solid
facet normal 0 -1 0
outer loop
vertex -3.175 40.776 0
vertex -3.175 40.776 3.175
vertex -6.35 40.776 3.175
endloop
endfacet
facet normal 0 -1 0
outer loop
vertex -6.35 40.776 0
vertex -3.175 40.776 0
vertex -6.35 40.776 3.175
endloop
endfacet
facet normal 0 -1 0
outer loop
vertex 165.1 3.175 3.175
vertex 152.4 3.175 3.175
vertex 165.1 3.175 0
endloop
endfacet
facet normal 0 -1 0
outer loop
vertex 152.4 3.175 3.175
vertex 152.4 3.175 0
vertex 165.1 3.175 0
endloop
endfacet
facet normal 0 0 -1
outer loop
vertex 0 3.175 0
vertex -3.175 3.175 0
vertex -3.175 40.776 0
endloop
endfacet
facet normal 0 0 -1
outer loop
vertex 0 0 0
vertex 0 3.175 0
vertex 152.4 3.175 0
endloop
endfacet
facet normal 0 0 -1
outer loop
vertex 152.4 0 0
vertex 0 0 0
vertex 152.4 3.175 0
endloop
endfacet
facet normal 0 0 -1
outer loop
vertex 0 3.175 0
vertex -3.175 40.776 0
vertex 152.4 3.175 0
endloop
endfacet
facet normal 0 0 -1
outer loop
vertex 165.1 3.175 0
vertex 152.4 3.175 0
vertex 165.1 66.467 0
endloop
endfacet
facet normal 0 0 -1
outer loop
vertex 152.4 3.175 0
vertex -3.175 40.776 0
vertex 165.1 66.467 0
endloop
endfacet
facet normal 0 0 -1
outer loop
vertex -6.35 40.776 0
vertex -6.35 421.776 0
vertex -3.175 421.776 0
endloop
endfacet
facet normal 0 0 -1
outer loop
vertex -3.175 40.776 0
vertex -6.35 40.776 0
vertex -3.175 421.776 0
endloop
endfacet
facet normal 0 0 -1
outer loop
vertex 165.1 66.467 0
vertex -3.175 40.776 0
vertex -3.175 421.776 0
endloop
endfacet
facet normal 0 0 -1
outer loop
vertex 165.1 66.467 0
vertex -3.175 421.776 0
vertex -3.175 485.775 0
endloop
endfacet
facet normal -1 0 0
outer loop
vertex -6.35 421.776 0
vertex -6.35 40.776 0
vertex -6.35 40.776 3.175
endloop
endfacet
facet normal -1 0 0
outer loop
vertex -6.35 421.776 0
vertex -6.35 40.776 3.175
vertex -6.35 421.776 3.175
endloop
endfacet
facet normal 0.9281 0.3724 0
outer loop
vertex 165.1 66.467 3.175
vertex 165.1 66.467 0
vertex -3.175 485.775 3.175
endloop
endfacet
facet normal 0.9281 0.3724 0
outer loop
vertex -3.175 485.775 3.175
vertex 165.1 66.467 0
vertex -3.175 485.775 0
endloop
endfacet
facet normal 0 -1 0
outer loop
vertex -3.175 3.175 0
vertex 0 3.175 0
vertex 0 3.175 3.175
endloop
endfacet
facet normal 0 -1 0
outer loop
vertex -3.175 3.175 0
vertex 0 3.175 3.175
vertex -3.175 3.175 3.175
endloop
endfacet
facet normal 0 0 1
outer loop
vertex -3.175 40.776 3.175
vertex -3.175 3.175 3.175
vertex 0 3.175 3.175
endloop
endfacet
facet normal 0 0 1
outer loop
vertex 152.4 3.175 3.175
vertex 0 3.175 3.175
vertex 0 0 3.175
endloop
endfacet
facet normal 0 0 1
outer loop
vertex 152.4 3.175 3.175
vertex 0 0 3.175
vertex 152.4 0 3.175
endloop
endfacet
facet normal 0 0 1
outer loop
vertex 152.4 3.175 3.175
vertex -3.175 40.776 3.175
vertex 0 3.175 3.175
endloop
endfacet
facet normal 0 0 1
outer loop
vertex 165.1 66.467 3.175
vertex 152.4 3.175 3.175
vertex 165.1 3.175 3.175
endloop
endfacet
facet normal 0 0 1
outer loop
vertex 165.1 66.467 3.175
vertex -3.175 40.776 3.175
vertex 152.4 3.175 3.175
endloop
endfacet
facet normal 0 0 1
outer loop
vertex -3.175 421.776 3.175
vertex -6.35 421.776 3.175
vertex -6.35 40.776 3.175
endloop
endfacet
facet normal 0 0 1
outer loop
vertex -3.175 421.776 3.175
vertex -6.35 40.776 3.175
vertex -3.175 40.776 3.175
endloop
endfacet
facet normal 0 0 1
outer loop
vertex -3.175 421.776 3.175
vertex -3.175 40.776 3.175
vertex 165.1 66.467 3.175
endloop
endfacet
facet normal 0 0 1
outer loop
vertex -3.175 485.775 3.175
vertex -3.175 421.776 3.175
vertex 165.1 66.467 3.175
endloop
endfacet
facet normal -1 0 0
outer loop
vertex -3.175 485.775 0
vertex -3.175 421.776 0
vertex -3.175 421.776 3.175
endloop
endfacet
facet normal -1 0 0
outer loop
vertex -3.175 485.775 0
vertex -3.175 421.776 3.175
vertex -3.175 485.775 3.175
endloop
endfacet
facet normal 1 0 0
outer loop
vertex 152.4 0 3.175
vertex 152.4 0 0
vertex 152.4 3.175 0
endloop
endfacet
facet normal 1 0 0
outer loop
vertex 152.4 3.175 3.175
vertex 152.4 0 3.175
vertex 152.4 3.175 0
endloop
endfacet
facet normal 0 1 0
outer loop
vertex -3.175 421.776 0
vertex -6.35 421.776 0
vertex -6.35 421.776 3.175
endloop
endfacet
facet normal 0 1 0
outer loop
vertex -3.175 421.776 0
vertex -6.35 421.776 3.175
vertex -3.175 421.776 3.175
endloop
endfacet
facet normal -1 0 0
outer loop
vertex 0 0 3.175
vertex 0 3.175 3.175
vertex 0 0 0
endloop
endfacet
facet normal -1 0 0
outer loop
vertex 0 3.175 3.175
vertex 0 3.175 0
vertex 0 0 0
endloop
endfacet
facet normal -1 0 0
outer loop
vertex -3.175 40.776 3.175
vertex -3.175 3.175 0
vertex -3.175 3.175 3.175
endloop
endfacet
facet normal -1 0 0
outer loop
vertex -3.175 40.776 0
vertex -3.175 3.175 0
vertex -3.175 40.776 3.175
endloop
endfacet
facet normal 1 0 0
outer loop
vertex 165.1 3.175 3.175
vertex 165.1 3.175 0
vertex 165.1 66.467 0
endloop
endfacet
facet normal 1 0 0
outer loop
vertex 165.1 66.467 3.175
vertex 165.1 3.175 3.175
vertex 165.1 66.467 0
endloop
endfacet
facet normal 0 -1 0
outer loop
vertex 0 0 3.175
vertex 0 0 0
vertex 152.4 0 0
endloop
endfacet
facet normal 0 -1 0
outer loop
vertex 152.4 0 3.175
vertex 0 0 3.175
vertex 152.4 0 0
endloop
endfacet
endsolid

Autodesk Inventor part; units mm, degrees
ref_plane "YZ Plane" through (0, 0, 0) normal (1, 0, 0) x (0, 1, 0)
ref_plane "XZ Plane" through (0, 0, 0) normal (0, 1, 0) x (-1, 0, 0)
ref_plane "XY Plane" through (0, 0, 0) normal (0, 0, 1) x (1, 0, 0)
sketch "Sketch1" plane through (0, 0, 0) normal (0, 0, 1) x (1, 0, 0)
  line L0 (0, 0) -> (152.4, 0)
  line L1 (152.4, 0) -> (152.4, 3.175)
  line L2 (152.4, 3.175) -> (0, 3.175)
  line L3 (0, 3.175) -> (0, 0)
  line L4 (0, 3.175) -> (11.1125, 3.175)
  line L5 (152.4, 3.175) -> (190.5, 3.175)
  line L6 (0, 3.175) -> (11.1125, 3.175)
  line L7 (0, 3.175) -> (-3.175, 3.175)
  line L8 (-3.175, 3.175) -> (-3.175, 485.775)
  line L9 (-3.175, 485.775) -> (0, 485.775)
  line L10 (0, 485.775) -> (0, 3.175)
  line L11 (-3.175, 40.7756) -> (-6.35, 40.7756)
  line L12 (-6.35, 40.7756) -> (-6.35, 421.7756)
  line L13 (-6.35, 421.7756) -> (-3.175, 421.7756)
  line L14 (-3.175, 421.7756) -> (-3.175, 40.7756)
  line L15 (190.5, 3.175) -> (-3.175, 485.775)
  line L16 (165.1, 3.175) -> (165.1, 66.675)
  line L17 (165.1, 3.175) -> (228.6, 3.175) construction
  point P0 (5.5563, 3.175)
  point P1 (-1.5875, 3.175)
  point P2 (-4.7625, 40.7756)
  point P3 (-3.175, 421.7756)
  point P4 (165.1, 66.4668)
  dimension "d0" = 152.4
  dimension "d1" = 3.175
  dimension "d7" = 38.1
  dimension "d15" = 3.175
  dimension "d16" = 482.6
  dimension "d17" = 3.175
  dimension "d18" = 381
  dimension "d19" = 37.6006
  dimension "d20" = 63.5
  dimension "d21" = 90
  dimension "d22" = 25.4
extrude "Extrusion1" add sketch "Sketch1" along normal blind 3.175 contours L3 L2 L1 L0 | L10 L15 L16 L5 L2 | L7 L8 L15 L10 | L11 L12 L13 L8
properties part number "side support"
